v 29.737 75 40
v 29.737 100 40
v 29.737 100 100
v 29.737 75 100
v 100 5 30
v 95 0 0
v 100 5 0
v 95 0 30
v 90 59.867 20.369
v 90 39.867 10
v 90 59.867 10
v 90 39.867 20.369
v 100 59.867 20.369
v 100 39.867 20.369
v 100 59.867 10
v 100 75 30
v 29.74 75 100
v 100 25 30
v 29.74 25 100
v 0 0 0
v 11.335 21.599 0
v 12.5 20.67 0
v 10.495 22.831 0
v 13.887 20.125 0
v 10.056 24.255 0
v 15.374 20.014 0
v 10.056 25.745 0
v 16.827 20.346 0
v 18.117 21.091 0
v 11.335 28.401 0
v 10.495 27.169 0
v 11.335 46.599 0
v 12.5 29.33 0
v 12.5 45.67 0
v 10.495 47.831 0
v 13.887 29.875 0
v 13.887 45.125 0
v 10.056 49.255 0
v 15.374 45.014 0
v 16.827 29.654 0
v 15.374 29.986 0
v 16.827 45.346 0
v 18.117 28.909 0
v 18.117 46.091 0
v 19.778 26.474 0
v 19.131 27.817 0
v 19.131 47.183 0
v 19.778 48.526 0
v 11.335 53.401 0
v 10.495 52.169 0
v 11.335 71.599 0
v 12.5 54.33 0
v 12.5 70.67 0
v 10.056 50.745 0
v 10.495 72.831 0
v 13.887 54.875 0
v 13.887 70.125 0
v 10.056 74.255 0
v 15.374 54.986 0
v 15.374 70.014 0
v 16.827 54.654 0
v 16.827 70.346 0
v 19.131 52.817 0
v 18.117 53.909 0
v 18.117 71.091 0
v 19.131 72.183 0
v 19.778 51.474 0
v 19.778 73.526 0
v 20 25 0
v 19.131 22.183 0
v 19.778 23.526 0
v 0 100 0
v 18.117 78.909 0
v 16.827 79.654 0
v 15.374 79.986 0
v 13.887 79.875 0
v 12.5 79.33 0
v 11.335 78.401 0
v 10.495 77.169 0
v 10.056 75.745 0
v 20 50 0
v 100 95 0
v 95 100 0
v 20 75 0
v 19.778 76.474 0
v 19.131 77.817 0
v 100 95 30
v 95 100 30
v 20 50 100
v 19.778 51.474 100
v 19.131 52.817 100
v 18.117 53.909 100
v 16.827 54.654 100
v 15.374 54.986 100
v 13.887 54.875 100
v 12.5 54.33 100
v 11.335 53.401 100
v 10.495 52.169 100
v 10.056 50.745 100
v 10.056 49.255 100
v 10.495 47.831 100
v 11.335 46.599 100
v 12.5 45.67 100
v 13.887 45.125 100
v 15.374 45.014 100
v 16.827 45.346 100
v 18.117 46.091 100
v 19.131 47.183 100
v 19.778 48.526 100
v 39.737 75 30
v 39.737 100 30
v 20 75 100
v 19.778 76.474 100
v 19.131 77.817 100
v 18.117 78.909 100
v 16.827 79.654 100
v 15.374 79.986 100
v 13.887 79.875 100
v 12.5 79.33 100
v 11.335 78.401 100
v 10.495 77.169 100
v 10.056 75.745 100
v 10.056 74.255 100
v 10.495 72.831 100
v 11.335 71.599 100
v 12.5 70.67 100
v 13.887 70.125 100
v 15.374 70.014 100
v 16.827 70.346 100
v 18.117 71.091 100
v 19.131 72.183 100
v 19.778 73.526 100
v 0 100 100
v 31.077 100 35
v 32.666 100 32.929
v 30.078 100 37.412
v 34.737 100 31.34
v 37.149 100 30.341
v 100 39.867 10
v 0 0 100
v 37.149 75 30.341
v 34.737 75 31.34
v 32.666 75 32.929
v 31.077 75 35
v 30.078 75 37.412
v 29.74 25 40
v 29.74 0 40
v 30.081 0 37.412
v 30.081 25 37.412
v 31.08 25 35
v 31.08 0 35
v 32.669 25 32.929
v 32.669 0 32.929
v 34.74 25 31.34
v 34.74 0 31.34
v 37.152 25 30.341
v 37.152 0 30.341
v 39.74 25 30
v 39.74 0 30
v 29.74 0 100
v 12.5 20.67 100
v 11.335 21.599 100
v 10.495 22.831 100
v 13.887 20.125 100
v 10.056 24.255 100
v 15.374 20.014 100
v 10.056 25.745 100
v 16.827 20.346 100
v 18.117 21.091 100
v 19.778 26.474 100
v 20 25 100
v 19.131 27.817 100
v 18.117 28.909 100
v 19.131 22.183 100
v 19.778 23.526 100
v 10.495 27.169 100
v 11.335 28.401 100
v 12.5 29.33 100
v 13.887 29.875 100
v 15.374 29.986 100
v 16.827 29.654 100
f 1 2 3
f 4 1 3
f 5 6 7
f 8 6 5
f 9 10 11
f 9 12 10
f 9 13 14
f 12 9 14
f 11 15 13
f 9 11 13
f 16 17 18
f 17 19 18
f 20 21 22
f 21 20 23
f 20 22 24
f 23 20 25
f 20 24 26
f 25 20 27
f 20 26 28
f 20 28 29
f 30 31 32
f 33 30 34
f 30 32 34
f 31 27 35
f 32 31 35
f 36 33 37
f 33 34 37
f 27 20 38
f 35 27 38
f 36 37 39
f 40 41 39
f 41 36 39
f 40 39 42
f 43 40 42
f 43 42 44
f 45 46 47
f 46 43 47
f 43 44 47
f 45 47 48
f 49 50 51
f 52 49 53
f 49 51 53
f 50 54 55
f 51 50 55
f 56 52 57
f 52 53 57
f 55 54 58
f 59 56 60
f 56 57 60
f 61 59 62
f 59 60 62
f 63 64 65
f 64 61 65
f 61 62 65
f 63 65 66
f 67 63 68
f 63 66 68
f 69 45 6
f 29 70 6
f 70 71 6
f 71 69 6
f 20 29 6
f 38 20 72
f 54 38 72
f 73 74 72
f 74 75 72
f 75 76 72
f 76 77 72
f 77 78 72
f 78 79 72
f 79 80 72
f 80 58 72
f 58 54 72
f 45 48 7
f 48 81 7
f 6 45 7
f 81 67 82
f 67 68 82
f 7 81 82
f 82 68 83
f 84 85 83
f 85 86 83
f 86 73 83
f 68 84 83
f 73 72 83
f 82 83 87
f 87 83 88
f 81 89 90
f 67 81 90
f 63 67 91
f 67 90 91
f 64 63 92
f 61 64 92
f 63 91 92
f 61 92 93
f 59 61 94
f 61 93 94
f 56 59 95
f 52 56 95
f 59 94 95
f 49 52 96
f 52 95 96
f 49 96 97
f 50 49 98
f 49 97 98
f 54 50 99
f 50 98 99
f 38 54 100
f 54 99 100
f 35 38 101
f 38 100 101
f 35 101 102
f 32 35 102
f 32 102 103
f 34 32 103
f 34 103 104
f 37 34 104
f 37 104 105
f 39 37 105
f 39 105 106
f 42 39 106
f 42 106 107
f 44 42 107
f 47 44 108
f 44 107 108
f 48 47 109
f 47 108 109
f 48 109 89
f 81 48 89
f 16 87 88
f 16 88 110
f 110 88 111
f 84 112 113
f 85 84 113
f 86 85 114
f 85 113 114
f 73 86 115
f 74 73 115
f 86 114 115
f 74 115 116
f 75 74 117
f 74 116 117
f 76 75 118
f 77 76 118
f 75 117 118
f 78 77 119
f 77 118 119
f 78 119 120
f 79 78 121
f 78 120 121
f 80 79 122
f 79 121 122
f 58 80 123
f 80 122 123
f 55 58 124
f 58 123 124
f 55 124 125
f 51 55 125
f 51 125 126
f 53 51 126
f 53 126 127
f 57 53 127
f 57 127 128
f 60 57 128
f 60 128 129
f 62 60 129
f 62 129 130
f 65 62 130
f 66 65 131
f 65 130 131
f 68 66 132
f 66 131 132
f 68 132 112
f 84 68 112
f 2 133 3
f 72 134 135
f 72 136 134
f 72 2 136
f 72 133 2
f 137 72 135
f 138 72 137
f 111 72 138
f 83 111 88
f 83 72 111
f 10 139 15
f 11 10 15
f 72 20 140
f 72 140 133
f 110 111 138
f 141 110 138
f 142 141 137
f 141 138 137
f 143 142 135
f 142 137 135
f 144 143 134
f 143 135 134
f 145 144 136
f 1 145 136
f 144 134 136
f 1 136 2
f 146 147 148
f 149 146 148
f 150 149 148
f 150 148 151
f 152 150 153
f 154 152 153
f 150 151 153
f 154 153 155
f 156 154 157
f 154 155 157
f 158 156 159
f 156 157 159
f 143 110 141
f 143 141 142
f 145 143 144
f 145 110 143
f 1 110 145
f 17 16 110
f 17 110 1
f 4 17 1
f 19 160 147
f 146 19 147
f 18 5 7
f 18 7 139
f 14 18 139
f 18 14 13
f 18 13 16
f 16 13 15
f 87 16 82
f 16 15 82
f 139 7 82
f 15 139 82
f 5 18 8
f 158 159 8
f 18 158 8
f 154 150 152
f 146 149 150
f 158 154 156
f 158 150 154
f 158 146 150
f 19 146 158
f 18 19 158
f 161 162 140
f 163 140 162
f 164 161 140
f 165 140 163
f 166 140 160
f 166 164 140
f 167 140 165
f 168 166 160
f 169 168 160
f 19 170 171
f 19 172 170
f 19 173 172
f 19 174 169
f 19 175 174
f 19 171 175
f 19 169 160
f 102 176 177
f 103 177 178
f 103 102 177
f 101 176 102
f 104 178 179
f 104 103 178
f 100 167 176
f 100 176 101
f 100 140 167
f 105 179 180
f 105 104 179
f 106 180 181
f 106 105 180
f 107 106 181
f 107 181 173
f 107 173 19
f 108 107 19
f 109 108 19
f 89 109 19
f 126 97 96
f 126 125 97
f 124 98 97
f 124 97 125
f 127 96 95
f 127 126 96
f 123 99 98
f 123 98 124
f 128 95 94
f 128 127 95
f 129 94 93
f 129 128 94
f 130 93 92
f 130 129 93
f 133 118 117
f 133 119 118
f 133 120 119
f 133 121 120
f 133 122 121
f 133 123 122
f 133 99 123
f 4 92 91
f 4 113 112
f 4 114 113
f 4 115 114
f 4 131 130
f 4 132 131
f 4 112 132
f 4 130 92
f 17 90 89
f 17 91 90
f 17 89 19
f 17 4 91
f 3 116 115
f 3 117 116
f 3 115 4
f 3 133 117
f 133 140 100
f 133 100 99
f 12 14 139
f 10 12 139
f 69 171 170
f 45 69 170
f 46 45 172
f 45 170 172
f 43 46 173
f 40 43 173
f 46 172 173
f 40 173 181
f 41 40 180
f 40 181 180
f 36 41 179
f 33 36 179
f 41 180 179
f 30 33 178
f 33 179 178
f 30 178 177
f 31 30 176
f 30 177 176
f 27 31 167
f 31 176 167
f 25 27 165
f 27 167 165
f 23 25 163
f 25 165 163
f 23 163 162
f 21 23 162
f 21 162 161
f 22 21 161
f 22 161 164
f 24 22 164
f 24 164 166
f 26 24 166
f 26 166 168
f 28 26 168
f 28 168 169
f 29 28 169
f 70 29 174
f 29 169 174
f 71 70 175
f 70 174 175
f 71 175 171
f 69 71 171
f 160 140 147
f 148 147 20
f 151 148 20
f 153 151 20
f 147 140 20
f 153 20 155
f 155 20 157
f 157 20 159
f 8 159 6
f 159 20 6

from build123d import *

# Parameters (mm, degrees)
F0_W      = 100
F0_H      = 100
F1_DEPTH  = 100
F2_R      = 5
F3_DEPTH  = 100
F5_DEPTH  = 25
F8_DEPTH  = 25
F10_DEPTH = 25
F11_DEPTH = 25
F12_SIZE  = 5
F14_DEPTH = 10


with BuildPart() as f1:
    # F0 (on Top) → F1 (new body)
    with BuildSketch(Plane.XY):
        with Locations((50, 50)):
            Rectangle(F0_W, F0_H)
    extrude(amount=F1_DEPTH)

    # F2 (on face) → F3 (cut)
    with BuildSketch(Plane.XY.offset(100)):
        with Locations((15, 25)):
            Circle(F2_R)
        with Locations((15, 50)):
            Circle(F2_R)
        with Locations((15, 75)):
            Circle(F2_R)
    extrude(amount=-F3_DEPTH, mode=Mode.SUBTRACT)

    # F4 (on face) → F5 (cut)
    with BuildSketch(Plane.XZ):
        with BuildLine():
            Line((39.7404471785, 30), (50, 30))
            Line((50, 30), (100, 30))
            Line((100, 30), (100, 100))
            Line((100, 100), (29.7404471785, 100))
            Line((29.7404471785, 100), (29.7404471785, 40))
            ThreePointArc((29.7404471785, 40), (32.6693793666, 32.9289321881), (39.7404471785, 30))
        make_face()
    extrude(amount=-F5_DEPTH, mode=Mode.SUBTRACT)

    # F7 (on face) → F8 (cut)
    with BuildSketch(Plane(origin=(0, 100, 0), x_dir=(-1, 0, 0), z_dir=(0, 1, 0))):
        with BuildLine():
            Line((-100, 30), (-39.7373309731, 30))
            ThreePointArc((-39.7373309731, 30), (-32.6662631613, 32.9289321881), (-29.7373309731, 40))
            Line((-29.7373309731, 40), (-29.7373309731, 100))
            Line((-29.7373309731, 100), (-100, 100))
            Line((-100, 100), (-100, 30))
        make_face()
    extrude(amount=-F8_DEPTH, mode=Mode.SUBTRACT)

    # F9 (on face) → F10 (cut)
    with BuildSketch(Plane.XZ.offset(-25)):
        Polygon((100, 100), (29.7404471785, 100), (100, 30), align=None)
    extrude(amount=-F10_DEPTH, mode=Mode.SUBTRACT)

    # F11 (cut): a face of the model
    f11_faces = [f1.faces().sort_by_distance(p)[0] for p in [
        (76.5801490595, 50, 76.6666666667),
    ]]
    extrude(f11_faces, amount=-F11_DEPTH, mode=Mode.SUBTRACT)

    # F12
    f12_edges = [f1.edges().sort_by_distance(p)[0] for p in [
        (100, 0, 15),
        (100, 100, 15),
    ]]
    chamfer(f12_edges, length=F12_SIZE)

    # F13 (on face) → F14 (cut)
    with BuildSketch(Plane.YZ.offset(100)):
        Polygon((39.8671727255, 10), (49.8671727255, 10), (59.8671727255, 10), (59.8671727255, 20.3688494319), (39.8671727255, 20.3688494319), align=None)
    extrude(amount=-F14_DEPTH, mode=Mode.SUBTRACT)


solid = f1.part
